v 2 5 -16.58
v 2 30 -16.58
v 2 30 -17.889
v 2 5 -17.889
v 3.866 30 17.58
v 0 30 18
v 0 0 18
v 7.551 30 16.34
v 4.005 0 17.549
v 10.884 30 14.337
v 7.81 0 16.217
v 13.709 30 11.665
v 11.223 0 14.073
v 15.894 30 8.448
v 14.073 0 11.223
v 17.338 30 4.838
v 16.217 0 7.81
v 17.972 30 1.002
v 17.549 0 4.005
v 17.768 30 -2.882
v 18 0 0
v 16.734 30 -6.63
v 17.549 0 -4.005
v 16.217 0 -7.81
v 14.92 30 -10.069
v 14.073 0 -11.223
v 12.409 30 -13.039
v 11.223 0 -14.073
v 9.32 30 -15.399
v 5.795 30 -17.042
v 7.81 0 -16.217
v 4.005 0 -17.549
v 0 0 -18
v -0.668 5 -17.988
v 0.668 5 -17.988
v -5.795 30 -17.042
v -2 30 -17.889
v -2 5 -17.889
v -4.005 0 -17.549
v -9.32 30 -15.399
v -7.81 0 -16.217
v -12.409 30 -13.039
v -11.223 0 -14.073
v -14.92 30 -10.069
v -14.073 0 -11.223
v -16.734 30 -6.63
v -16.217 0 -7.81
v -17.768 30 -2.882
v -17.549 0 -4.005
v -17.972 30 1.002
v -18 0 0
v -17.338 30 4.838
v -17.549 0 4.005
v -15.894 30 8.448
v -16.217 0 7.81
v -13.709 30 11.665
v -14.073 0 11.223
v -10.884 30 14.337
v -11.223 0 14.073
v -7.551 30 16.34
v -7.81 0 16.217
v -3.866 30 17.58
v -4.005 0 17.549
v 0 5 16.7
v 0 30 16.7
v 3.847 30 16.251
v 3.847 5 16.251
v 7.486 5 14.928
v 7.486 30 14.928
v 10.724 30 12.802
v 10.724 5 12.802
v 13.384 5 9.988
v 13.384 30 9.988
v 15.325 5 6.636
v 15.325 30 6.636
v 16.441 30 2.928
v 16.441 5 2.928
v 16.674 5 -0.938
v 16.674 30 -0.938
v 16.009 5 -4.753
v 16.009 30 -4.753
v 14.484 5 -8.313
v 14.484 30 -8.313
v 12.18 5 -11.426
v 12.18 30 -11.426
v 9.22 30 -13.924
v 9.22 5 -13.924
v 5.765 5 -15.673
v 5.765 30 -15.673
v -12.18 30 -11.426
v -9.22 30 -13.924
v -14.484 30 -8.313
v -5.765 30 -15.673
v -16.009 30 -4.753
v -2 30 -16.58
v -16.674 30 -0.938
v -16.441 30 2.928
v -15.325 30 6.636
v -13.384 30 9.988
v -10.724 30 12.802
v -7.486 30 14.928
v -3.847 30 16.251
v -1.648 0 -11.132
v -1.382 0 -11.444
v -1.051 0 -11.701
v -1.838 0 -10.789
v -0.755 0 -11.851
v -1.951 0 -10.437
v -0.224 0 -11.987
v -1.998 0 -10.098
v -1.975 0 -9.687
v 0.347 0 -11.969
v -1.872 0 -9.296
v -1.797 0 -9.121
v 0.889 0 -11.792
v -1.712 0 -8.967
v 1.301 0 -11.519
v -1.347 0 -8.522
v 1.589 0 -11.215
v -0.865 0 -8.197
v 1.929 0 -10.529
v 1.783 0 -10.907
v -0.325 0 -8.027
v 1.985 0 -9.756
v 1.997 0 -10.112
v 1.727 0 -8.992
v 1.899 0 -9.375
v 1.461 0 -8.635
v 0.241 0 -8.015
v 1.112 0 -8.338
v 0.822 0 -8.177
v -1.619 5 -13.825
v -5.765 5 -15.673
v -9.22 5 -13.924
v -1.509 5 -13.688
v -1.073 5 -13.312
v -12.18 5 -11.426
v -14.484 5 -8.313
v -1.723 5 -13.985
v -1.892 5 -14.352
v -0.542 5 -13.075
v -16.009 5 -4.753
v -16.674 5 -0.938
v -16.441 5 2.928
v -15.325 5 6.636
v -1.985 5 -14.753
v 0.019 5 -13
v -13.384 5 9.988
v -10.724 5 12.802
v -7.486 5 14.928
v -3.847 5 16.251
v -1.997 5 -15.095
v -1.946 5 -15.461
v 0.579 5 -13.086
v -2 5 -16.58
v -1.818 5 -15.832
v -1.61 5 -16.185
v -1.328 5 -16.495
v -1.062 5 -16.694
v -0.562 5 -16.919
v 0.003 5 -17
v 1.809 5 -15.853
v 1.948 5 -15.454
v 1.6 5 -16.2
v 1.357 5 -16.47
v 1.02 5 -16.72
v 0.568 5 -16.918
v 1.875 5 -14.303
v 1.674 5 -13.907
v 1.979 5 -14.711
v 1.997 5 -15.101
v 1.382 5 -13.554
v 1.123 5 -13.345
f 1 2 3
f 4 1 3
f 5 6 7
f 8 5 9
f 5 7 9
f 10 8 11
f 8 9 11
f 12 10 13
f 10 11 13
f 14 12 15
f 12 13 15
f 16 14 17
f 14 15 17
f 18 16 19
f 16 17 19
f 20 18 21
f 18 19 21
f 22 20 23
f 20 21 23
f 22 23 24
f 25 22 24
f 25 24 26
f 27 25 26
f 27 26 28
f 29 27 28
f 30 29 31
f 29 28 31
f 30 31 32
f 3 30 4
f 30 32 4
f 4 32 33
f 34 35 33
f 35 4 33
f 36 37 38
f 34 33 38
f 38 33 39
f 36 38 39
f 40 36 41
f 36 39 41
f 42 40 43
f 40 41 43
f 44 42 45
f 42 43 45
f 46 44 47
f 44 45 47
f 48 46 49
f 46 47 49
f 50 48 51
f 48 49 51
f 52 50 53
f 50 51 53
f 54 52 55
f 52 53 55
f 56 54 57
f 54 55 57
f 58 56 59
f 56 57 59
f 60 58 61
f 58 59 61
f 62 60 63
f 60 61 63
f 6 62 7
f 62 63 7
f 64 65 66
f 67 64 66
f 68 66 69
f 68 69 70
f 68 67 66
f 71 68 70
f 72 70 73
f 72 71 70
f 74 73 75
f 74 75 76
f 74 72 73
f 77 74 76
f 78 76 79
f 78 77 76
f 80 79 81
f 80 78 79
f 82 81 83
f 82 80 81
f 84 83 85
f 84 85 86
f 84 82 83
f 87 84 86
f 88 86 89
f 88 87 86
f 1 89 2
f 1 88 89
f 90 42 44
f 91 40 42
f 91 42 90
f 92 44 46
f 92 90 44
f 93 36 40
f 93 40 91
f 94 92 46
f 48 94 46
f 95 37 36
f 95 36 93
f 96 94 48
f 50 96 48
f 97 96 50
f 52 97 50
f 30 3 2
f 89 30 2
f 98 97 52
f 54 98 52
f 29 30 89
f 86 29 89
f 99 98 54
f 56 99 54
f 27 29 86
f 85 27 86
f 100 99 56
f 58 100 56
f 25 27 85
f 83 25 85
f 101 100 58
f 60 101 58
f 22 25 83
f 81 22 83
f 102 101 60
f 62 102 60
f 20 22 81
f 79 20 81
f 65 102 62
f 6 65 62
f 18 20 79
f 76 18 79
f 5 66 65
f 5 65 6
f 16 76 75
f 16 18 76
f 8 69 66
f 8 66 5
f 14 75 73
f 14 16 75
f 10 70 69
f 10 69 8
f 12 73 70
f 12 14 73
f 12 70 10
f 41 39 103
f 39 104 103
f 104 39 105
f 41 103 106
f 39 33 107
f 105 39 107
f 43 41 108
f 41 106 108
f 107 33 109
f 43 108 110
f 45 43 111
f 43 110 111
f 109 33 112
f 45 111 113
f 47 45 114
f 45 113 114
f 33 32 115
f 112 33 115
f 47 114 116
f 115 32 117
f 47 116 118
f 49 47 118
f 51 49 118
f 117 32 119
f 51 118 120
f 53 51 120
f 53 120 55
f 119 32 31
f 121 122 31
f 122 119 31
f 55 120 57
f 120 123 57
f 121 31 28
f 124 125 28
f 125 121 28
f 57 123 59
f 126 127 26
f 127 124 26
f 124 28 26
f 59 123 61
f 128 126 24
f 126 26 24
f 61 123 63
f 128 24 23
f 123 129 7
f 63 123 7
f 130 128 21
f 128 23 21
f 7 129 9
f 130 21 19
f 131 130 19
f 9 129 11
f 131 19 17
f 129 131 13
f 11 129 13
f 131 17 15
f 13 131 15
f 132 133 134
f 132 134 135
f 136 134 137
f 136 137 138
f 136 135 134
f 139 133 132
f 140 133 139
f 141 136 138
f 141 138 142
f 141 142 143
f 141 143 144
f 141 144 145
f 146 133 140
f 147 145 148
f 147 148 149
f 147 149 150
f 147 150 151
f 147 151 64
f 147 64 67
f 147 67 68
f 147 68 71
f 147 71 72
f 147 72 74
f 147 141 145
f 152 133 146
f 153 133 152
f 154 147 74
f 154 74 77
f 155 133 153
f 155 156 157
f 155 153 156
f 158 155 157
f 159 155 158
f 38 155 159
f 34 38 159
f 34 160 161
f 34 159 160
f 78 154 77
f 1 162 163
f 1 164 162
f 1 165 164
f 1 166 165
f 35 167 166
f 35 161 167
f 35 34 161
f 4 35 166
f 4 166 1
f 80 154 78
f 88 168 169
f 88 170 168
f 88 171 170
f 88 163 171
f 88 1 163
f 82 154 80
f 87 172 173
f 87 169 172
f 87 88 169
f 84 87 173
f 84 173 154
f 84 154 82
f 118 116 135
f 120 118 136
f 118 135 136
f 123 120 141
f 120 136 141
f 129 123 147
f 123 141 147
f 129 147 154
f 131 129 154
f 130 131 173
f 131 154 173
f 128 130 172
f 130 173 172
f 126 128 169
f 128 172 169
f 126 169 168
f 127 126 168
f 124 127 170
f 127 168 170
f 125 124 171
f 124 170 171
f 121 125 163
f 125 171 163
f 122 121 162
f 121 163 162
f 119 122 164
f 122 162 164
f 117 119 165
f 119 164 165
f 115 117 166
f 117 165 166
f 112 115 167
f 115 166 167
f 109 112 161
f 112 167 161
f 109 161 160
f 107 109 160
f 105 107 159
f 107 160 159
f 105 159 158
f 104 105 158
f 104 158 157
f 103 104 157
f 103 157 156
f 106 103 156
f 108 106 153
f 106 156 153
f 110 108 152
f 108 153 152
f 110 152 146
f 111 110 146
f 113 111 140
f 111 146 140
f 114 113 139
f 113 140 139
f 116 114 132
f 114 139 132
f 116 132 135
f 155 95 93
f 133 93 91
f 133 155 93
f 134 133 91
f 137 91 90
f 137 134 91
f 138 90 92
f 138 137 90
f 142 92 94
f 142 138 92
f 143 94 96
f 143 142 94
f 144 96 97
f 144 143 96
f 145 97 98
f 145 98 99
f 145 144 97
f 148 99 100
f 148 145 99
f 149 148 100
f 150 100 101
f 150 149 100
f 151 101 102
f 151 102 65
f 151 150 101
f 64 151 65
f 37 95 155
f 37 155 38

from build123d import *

# Parameters (mm, degrees)
SKETCH1_R           = 18
BOSS_EXTRUDE1_DEPTH = 5
SKETCH2_R           = 18
SKETCH2_R_2         = 16.7
BOSS_EXTRUDE2_DEPTH = 25
SKETCH3_W           = 4
SKETCH3_H           = 4.625561496
CUT_EXTRUDE1_DEPTH  = 25


with BuildPart() as part:
    # Sketch1 → Boss-Extrude1 (new body)
    with BuildSketch(Plane(origin=(0, 0, 0), x_dir=(1, 0, 0), z_dir=(0, 1, 0))):
        with Locations(Location((0, 0, 0), (0, 0, 270))):
            Circle(SKETCH1_R)
    extrude(amount=BOSS_EXTRUDE1_DEPTH)

    # Sketch2 → Boss-Extrude2 (add)
    with BuildSketch(Plane(origin=(0, 5, 0), x_dir=(1, 0, 0), z_dir=(0, 1, 0))):
        with Locations(Location((0, 0, 0), (0, 0, 270))):
            Circle(SKETCH2_R)
        with Locations(Location((0, 0, 0), (0, 0, 270))):
            Circle(SKETCH2_R_2, mode=Mode.SUBTRACT)
    extrude(amount=BOSS_EXTRUDE2_DEPTH)

    # Sketch3 → Cut-Extrude1 (cut)
    with BuildSketch(Plane(origin=(0, 30, 0), x_dir=(1, 0, 0), z_dir=(0, 1, 0))):
        with Locations((0, 16.7)):
            Rectangle(SKETCH3_W, SKETCH3_H)
    extrude(amount=-CUT_EXTRUDE1_DEPTH, mode=Mode.SUBTRACT)

    # Cut-Loft1: read off the stored shape, not the designer's step
    # Cut-Loft1: loft between two sections, ruled curve by curve
    cut_loft1_from = [
        Edge.make_bspline([(-1.712462043, 0, -8.966813787), (-1.626363192, 0, -8.824108617), (-1.511615223, 0, -8.673150149), (-1.197727621, 0, -8.384153579), (-0.9972614, 0, -8.245981525), (-0.502854414, 0, -8.045966083), (-0.20751606, 0, -7.986207367), (0.419056865, 0, -8.019390239), (0.747775872, 0, -8.115340255), (1.318596553, 0, -8.459735659), (1.556747911, 0, -8.705797688), (1.878250858, 0, -9.244621024), (1.963090928, 0, -9.533754229), (2.016671796, 0, -10.064389259), (1.987908436, 0, -10.306155451), (1.878602966, 0, -10.718583333), (1.798560894, 0, -10.890481042), (1.626363192, 0, -11.175891383), (1.511615223, 0, -11.326849851), (1.197727621, 0, -11.615846421), (0.9972614, 0, -11.754018475), (0.502854414, 0, -11.954033917), (0.20751606, 0, -12.013792633), (-0.419056865, 0, -11.980609761), (-0.747775872, 0, -11.884659745), (-1.318596553, 0, -11.540264341), (-1.556747911, 0, -11.294202312), (-1.878250858, 0, -10.755378976), (-1.963090928, 0, -10.466245771), (-2.016671796, 0, -9.935610741), (-1.987908436, 0, -9.693844549), (-1.878602966, 0, -9.281416667), (-1.798560894, 0, -9.109518958), (-1.712462043, 0, -8.966813787)], [0, 0, 0, 0, 0.0625, 0.0625, 0.125, 0.125, 0.1875, 0.1875, 0.25, 0.25, 0.3125, 0.3125, 0.375, 0.375, 0.4375, 0.4375, 0.5, 0.5, 0.5625, 0.5625, 0.625, 0.625, 0.6875, 0.6875, 0.75, 0.75, 0.8125, 0.8125, 0.875, 0.875, 0.9375, 0.9375, 1, 1, 1, 1], 3),
    ]
    cut_loft1_to = [
        Edge.make_bspline([(-1.509327554, 5, -13.687776568), (-1.399975601, 5, -13.561999272), (-1.260982153, 5, -13.433017192), (-0.902081628, 5, -13.202290388), (-0.680844687, 5, -13.100641787), (-0.15941128, 5, -12.988607658), (0.14180355, 5, -12.980516047), (0.75334128, 5, -13.120930922), (1.06066884, 5, -13.271968541), (1.563778024, 5, -13.709376352), (1.756077925, 5, -13.9927195), (1.980154065, 5, -14.578795106), (2.014020397, 5, -14.8782094), (1.975571807, 5, -15.410155027), (1.905670109, 5, -15.643375898), (1.727083916, 5, -16.030869661), (1.618679506, 5, -16.186446136), (1.399975601, 5, -16.438000728), (1.260982153, 5, -16.566982808), (0.902081628, 5, -16.797709612), (0.680844687, 5, -16.899358213), (0.15941128, 5, -17.011392342), (-0.14180355, 5, -17.019483953), (-0.75334128, 5, -16.879069078), (-1.06066884, 5, -16.728031459), (-1.563778024, 5, -16.290623648), (-1.756077925, 5, -16.0072805), (-1.980154065, 5, -15.421204894), (-2.014020397, 5, -15.1217906), (-1.975571807, 5, -14.589844973), (-1.905670109, 5, -14.356624102), (-1.727083916, 5, -13.969130339), (-1.618679506, 5, -13.813553864), (-1.509327554, 5, -13.687776568)], [0, 0, 0, 0, 0.0625, 0.0625, 0.125, 0.125, 0.1875, 0.1875, 0.25, 0.25, 0.3125, 0.3125, 0.375, 0.375, 0.4375, 0.4375, 0.5, 0.5, 0.5625, 0.5625, 0.625, 0.625, 0.6875, 0.6875, 0.75, 0.75, 0.8125, 0.8125, 0.875, 0.875, 0.9375, 0.9375, 1, 1, 1, 1], 3),
    ]
    cut_loft1 = Solid(Shell([*[Face.make_surface_from_curves(cut_loft1_from[k], cut_loft1_to[k]) for k in range(1)], Face(Wire(cut_loft1_from)), Face(Wire(cut_loft1_to))]))
    add(cut_loft1, mode=Mode.SUBTRACT)


solid = part.part
